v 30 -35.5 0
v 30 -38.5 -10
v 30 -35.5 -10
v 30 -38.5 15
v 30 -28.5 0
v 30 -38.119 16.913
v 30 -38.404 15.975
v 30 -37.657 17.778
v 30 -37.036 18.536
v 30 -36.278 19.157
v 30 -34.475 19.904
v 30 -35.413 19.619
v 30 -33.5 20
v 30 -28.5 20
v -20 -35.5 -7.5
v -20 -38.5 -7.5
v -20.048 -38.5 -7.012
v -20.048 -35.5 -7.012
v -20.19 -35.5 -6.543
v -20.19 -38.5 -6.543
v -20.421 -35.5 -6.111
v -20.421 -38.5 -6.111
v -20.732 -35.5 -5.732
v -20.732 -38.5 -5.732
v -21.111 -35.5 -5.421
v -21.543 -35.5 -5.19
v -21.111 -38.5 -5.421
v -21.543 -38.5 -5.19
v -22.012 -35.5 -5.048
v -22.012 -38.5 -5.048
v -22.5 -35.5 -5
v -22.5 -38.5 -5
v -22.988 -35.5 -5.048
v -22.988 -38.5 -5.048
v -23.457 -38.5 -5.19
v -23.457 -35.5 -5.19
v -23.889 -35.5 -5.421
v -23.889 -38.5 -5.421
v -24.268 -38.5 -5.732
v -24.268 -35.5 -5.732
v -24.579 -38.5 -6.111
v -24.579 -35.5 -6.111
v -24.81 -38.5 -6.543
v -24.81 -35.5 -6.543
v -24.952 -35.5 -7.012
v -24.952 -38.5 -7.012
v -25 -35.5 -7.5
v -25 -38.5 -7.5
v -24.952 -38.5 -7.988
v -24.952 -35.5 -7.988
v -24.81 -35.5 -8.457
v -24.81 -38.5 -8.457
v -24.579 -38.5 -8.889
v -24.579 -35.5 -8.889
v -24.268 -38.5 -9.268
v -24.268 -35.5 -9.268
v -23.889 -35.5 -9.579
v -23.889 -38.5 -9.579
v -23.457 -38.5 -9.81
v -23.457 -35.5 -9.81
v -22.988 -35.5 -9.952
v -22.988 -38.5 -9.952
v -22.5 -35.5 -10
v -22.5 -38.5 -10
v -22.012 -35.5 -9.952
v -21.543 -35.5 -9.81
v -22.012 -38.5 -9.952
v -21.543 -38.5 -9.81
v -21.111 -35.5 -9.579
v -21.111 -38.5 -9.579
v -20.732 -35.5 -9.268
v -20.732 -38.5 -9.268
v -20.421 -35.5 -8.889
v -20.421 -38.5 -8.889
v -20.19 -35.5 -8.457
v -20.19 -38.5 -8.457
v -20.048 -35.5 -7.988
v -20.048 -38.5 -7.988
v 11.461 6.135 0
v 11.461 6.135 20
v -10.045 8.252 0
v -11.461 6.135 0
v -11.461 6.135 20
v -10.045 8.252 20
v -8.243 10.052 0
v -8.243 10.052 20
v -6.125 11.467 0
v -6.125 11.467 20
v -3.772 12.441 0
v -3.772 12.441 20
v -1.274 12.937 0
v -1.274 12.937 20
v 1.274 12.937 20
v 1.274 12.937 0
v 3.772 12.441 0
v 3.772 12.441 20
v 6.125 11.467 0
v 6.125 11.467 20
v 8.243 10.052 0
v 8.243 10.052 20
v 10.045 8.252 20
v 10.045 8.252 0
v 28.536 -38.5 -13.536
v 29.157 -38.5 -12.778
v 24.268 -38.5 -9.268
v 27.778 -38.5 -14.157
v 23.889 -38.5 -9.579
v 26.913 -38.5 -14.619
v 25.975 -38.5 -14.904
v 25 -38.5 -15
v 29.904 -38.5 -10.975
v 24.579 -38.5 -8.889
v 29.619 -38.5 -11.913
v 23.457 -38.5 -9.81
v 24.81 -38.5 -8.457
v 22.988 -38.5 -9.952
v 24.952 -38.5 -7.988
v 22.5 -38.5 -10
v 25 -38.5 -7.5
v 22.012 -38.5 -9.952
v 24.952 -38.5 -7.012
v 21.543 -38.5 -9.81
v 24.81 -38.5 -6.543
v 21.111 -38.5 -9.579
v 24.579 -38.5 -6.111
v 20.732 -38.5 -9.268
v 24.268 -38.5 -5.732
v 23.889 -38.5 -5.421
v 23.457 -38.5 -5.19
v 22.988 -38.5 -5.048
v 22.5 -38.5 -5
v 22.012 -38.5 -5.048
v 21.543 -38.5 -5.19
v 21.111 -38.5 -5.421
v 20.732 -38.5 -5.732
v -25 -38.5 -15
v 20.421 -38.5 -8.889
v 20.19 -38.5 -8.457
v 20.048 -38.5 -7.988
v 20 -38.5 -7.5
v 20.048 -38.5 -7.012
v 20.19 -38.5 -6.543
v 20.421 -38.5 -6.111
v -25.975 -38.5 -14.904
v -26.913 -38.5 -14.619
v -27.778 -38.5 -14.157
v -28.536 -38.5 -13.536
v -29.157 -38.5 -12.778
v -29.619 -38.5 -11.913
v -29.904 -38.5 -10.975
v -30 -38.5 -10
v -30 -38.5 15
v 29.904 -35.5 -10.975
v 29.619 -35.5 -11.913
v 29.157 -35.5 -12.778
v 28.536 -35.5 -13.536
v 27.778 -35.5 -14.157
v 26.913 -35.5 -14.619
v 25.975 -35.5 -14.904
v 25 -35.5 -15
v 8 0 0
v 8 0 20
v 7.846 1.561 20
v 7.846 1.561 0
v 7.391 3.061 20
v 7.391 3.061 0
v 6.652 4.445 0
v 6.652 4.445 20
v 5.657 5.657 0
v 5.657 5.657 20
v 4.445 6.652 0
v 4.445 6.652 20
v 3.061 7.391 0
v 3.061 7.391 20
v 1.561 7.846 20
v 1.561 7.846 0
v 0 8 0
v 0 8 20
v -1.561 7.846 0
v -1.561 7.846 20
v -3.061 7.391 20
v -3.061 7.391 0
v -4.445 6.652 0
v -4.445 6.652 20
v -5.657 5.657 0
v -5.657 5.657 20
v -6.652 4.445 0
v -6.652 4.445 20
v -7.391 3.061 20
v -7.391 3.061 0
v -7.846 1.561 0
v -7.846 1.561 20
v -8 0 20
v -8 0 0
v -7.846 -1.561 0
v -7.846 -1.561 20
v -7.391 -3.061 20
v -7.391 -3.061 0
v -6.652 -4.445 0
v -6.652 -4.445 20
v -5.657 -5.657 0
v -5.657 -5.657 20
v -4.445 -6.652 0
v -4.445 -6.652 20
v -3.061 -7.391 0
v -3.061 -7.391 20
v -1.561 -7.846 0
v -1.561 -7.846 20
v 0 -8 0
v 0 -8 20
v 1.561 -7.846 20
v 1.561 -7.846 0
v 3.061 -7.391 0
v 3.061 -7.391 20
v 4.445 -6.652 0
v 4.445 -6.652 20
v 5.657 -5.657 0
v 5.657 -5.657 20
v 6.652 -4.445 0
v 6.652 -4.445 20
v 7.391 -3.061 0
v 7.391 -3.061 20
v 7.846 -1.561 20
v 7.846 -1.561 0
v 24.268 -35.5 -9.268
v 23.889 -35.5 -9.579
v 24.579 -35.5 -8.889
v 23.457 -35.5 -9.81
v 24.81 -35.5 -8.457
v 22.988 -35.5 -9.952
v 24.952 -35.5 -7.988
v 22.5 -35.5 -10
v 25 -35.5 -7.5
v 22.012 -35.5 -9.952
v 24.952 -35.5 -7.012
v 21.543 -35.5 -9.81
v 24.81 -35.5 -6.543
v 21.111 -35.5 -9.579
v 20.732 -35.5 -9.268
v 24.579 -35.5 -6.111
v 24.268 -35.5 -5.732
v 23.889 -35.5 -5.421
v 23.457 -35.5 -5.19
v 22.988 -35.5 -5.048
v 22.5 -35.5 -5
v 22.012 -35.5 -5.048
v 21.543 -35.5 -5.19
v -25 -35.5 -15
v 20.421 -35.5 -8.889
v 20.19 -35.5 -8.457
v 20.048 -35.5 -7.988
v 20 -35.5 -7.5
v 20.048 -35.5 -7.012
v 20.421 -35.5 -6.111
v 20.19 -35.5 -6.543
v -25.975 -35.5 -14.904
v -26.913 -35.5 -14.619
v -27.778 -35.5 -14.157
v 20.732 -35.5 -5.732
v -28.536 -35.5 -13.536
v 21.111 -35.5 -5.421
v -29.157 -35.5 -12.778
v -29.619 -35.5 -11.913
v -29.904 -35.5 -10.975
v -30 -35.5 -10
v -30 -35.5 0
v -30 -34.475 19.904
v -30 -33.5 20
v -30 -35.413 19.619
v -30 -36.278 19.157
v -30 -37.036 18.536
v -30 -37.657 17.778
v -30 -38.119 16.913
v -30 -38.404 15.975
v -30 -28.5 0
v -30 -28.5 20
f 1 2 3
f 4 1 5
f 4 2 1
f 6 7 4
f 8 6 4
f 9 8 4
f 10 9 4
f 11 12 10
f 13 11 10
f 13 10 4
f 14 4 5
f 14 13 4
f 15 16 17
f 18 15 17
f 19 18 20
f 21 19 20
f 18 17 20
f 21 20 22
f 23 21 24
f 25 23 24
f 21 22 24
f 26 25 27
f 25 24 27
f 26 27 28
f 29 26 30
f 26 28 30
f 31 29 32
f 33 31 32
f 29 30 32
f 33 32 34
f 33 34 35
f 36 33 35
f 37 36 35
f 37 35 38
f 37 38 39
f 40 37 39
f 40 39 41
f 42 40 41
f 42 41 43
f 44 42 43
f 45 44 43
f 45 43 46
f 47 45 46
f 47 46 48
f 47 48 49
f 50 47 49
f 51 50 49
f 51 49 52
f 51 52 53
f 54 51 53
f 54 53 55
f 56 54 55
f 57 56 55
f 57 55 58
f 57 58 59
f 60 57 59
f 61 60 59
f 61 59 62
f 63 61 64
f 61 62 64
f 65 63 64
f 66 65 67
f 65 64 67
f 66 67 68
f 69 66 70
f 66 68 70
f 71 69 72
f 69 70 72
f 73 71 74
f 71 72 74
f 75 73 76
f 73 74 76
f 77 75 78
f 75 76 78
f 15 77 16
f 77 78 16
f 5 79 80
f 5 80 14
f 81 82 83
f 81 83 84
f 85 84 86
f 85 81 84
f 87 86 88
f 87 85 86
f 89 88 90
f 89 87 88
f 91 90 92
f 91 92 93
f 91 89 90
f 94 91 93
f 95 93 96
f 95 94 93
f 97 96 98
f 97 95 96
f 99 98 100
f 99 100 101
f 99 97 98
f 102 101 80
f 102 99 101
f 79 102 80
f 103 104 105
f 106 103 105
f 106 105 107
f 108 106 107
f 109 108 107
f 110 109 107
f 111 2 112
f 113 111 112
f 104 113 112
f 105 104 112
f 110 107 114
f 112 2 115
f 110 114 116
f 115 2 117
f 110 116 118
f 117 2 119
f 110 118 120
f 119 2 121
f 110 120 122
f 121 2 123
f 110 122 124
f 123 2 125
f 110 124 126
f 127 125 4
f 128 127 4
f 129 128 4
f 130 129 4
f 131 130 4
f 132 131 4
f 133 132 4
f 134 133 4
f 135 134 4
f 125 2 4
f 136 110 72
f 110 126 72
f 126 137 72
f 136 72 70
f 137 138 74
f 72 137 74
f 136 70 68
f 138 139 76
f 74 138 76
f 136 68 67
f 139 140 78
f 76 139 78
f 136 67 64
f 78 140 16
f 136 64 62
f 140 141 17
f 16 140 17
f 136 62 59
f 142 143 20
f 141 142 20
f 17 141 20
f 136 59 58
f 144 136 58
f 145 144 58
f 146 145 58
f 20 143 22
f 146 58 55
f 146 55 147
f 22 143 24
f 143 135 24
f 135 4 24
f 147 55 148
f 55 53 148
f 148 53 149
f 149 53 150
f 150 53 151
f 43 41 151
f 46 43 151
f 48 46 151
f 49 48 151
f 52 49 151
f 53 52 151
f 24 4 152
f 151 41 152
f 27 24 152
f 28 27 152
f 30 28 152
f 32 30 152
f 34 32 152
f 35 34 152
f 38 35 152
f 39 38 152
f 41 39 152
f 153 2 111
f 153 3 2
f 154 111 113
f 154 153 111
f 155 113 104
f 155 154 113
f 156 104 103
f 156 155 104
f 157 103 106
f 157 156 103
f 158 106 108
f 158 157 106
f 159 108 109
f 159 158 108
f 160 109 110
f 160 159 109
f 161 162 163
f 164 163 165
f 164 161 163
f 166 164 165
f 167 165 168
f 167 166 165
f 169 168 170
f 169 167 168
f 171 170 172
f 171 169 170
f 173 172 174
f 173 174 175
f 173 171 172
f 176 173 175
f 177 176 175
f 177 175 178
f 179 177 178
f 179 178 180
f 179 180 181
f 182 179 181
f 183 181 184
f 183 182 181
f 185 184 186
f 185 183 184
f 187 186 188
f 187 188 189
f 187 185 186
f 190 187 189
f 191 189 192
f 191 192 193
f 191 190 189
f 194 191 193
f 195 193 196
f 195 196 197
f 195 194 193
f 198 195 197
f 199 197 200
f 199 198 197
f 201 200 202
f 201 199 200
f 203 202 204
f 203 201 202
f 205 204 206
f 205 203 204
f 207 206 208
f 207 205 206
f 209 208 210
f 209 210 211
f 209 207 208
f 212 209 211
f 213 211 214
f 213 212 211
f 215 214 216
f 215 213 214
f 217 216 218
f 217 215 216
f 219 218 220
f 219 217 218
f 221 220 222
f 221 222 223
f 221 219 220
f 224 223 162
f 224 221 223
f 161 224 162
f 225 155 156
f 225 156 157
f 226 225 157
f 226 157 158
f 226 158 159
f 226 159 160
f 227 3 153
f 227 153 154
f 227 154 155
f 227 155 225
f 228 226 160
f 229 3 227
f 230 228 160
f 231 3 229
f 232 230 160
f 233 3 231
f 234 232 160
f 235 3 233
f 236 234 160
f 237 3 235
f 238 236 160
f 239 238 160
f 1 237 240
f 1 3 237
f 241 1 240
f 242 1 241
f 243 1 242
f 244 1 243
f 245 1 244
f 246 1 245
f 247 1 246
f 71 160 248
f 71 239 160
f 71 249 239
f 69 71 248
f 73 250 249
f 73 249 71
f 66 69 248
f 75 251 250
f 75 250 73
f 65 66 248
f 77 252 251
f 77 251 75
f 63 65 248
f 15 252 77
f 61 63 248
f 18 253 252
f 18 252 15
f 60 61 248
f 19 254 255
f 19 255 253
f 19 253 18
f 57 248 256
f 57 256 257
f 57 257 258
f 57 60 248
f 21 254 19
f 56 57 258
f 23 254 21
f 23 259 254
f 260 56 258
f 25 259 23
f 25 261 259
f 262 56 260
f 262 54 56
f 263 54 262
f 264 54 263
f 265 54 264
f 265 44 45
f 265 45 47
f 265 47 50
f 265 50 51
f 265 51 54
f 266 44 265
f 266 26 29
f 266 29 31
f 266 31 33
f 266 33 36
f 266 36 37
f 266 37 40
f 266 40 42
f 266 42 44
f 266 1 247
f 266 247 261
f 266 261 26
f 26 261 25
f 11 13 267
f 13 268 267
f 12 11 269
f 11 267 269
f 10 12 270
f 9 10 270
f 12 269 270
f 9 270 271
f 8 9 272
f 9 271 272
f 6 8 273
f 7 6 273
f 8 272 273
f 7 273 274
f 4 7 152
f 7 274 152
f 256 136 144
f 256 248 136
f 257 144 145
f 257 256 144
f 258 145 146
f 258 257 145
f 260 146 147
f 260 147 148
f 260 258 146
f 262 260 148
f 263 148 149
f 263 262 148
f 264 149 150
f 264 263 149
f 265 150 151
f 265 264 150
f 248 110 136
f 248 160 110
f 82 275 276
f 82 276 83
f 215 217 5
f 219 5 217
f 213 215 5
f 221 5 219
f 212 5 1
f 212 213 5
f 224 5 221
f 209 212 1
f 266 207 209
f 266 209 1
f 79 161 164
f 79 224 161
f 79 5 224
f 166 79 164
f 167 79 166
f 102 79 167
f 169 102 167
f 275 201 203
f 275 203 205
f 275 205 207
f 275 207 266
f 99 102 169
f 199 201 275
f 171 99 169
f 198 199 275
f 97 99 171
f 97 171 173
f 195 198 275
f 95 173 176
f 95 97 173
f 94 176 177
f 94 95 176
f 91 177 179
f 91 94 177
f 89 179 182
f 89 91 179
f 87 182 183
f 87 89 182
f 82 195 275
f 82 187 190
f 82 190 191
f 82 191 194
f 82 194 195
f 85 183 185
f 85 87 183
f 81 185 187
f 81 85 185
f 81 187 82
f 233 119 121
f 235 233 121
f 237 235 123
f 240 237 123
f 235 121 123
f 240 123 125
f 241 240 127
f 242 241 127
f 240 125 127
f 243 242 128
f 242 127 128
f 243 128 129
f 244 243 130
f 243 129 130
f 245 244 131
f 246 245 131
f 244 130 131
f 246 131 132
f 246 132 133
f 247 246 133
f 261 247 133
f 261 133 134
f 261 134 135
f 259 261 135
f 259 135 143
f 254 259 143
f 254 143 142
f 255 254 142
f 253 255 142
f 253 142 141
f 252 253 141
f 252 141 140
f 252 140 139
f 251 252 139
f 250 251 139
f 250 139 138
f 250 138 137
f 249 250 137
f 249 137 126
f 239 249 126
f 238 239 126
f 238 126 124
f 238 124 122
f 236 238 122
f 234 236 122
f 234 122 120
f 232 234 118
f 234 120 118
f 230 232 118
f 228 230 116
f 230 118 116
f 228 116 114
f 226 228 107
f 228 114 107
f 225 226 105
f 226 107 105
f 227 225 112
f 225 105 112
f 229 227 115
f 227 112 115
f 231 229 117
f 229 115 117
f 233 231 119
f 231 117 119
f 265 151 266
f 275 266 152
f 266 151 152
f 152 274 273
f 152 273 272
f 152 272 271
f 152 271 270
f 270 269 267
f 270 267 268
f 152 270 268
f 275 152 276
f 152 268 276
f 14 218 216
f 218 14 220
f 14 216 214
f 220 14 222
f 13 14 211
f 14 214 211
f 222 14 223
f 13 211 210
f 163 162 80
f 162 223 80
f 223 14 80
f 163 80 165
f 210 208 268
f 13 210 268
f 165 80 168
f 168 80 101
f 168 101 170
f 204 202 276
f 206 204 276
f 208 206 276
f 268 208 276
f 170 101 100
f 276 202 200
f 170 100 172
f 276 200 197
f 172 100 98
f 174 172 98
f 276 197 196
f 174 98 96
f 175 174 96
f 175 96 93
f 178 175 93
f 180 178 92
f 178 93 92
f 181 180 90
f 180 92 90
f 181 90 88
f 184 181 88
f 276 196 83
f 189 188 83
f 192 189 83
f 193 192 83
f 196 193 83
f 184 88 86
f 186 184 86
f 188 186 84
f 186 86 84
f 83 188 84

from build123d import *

# Parameters (mm, degrees)
SKETCH1_R           = 8
BOSS_EXTRUDE1_DEPTH = 20
SKETCH2_W           = 60
SKETCH2_H           = 3
BOSS_EXTRUDE2_DEPTH = 15
SKETCH3_R           = 2.5
CUT_EXTRUDE1_DEPTH  = 20
FILLET1_R           = 5


with BuildPart() as part:
    # Sketch1 → Boss-Extrude1 (new body)
    with BuildSketch(Plane.XY):
        with BuildLine():
            Line((30, -28.5), (30, -38.5))
            Line((30, -38.5), (-30, -38.5))
            Line((-30, -38.5), (-30, -28.5))
            Line((-30, -28.5), (-11.461412637, 6.13482032))
            ThreePointArc((-11.461412637, 6.13482032), (0, 13), (11.461412637, 6.13482032))
            Line((11.461412637, 6.13482032), (30, -28.5))
        make_face()
        Circle(SKETCH1_R, mode=Mode.SUBTRACT)
    extrude(amount=BOSS_EXTRUDE1_DEPTH)

    # Sketch2 → Boss-Extrude2 (add)
    with BuildSketch(Plane(origin=(0, 0, 0), x_dir=(-1, 0, 0), z_dir=(0, 0, -1))):
        with Locations((0, -37)):
            Rectangle(SKETCH2_W, SKETCH2_H)
    extrude(amount=BOSS_EXTRUDE2_DEPTH)

    # Sketch3 → Cut-Extrude1 (cut)
    with BuildSketch(Plane.XZ.offset(38.5)):
        with Locations((22.5, -7.5)):
            Circle(SKETCH3_R)
        with Locations((-22.5, -7.5)):
            Circle(SKETCH3_R)
    extrude(amount=-CUT_EXTRUDE1_DEPTH, mode=Mode.SUBTRACT)

    # Fillet1
    fillet1_edges = [part.edges().sort_by_distance(p)[0] for p in [
        (30, -37, -15),
        (-30, -37, -15),
        (0, -38.5, 20),
    ]]
    fillet(fillet1_edges, radius=FILLET1_R)


solid = part.part
